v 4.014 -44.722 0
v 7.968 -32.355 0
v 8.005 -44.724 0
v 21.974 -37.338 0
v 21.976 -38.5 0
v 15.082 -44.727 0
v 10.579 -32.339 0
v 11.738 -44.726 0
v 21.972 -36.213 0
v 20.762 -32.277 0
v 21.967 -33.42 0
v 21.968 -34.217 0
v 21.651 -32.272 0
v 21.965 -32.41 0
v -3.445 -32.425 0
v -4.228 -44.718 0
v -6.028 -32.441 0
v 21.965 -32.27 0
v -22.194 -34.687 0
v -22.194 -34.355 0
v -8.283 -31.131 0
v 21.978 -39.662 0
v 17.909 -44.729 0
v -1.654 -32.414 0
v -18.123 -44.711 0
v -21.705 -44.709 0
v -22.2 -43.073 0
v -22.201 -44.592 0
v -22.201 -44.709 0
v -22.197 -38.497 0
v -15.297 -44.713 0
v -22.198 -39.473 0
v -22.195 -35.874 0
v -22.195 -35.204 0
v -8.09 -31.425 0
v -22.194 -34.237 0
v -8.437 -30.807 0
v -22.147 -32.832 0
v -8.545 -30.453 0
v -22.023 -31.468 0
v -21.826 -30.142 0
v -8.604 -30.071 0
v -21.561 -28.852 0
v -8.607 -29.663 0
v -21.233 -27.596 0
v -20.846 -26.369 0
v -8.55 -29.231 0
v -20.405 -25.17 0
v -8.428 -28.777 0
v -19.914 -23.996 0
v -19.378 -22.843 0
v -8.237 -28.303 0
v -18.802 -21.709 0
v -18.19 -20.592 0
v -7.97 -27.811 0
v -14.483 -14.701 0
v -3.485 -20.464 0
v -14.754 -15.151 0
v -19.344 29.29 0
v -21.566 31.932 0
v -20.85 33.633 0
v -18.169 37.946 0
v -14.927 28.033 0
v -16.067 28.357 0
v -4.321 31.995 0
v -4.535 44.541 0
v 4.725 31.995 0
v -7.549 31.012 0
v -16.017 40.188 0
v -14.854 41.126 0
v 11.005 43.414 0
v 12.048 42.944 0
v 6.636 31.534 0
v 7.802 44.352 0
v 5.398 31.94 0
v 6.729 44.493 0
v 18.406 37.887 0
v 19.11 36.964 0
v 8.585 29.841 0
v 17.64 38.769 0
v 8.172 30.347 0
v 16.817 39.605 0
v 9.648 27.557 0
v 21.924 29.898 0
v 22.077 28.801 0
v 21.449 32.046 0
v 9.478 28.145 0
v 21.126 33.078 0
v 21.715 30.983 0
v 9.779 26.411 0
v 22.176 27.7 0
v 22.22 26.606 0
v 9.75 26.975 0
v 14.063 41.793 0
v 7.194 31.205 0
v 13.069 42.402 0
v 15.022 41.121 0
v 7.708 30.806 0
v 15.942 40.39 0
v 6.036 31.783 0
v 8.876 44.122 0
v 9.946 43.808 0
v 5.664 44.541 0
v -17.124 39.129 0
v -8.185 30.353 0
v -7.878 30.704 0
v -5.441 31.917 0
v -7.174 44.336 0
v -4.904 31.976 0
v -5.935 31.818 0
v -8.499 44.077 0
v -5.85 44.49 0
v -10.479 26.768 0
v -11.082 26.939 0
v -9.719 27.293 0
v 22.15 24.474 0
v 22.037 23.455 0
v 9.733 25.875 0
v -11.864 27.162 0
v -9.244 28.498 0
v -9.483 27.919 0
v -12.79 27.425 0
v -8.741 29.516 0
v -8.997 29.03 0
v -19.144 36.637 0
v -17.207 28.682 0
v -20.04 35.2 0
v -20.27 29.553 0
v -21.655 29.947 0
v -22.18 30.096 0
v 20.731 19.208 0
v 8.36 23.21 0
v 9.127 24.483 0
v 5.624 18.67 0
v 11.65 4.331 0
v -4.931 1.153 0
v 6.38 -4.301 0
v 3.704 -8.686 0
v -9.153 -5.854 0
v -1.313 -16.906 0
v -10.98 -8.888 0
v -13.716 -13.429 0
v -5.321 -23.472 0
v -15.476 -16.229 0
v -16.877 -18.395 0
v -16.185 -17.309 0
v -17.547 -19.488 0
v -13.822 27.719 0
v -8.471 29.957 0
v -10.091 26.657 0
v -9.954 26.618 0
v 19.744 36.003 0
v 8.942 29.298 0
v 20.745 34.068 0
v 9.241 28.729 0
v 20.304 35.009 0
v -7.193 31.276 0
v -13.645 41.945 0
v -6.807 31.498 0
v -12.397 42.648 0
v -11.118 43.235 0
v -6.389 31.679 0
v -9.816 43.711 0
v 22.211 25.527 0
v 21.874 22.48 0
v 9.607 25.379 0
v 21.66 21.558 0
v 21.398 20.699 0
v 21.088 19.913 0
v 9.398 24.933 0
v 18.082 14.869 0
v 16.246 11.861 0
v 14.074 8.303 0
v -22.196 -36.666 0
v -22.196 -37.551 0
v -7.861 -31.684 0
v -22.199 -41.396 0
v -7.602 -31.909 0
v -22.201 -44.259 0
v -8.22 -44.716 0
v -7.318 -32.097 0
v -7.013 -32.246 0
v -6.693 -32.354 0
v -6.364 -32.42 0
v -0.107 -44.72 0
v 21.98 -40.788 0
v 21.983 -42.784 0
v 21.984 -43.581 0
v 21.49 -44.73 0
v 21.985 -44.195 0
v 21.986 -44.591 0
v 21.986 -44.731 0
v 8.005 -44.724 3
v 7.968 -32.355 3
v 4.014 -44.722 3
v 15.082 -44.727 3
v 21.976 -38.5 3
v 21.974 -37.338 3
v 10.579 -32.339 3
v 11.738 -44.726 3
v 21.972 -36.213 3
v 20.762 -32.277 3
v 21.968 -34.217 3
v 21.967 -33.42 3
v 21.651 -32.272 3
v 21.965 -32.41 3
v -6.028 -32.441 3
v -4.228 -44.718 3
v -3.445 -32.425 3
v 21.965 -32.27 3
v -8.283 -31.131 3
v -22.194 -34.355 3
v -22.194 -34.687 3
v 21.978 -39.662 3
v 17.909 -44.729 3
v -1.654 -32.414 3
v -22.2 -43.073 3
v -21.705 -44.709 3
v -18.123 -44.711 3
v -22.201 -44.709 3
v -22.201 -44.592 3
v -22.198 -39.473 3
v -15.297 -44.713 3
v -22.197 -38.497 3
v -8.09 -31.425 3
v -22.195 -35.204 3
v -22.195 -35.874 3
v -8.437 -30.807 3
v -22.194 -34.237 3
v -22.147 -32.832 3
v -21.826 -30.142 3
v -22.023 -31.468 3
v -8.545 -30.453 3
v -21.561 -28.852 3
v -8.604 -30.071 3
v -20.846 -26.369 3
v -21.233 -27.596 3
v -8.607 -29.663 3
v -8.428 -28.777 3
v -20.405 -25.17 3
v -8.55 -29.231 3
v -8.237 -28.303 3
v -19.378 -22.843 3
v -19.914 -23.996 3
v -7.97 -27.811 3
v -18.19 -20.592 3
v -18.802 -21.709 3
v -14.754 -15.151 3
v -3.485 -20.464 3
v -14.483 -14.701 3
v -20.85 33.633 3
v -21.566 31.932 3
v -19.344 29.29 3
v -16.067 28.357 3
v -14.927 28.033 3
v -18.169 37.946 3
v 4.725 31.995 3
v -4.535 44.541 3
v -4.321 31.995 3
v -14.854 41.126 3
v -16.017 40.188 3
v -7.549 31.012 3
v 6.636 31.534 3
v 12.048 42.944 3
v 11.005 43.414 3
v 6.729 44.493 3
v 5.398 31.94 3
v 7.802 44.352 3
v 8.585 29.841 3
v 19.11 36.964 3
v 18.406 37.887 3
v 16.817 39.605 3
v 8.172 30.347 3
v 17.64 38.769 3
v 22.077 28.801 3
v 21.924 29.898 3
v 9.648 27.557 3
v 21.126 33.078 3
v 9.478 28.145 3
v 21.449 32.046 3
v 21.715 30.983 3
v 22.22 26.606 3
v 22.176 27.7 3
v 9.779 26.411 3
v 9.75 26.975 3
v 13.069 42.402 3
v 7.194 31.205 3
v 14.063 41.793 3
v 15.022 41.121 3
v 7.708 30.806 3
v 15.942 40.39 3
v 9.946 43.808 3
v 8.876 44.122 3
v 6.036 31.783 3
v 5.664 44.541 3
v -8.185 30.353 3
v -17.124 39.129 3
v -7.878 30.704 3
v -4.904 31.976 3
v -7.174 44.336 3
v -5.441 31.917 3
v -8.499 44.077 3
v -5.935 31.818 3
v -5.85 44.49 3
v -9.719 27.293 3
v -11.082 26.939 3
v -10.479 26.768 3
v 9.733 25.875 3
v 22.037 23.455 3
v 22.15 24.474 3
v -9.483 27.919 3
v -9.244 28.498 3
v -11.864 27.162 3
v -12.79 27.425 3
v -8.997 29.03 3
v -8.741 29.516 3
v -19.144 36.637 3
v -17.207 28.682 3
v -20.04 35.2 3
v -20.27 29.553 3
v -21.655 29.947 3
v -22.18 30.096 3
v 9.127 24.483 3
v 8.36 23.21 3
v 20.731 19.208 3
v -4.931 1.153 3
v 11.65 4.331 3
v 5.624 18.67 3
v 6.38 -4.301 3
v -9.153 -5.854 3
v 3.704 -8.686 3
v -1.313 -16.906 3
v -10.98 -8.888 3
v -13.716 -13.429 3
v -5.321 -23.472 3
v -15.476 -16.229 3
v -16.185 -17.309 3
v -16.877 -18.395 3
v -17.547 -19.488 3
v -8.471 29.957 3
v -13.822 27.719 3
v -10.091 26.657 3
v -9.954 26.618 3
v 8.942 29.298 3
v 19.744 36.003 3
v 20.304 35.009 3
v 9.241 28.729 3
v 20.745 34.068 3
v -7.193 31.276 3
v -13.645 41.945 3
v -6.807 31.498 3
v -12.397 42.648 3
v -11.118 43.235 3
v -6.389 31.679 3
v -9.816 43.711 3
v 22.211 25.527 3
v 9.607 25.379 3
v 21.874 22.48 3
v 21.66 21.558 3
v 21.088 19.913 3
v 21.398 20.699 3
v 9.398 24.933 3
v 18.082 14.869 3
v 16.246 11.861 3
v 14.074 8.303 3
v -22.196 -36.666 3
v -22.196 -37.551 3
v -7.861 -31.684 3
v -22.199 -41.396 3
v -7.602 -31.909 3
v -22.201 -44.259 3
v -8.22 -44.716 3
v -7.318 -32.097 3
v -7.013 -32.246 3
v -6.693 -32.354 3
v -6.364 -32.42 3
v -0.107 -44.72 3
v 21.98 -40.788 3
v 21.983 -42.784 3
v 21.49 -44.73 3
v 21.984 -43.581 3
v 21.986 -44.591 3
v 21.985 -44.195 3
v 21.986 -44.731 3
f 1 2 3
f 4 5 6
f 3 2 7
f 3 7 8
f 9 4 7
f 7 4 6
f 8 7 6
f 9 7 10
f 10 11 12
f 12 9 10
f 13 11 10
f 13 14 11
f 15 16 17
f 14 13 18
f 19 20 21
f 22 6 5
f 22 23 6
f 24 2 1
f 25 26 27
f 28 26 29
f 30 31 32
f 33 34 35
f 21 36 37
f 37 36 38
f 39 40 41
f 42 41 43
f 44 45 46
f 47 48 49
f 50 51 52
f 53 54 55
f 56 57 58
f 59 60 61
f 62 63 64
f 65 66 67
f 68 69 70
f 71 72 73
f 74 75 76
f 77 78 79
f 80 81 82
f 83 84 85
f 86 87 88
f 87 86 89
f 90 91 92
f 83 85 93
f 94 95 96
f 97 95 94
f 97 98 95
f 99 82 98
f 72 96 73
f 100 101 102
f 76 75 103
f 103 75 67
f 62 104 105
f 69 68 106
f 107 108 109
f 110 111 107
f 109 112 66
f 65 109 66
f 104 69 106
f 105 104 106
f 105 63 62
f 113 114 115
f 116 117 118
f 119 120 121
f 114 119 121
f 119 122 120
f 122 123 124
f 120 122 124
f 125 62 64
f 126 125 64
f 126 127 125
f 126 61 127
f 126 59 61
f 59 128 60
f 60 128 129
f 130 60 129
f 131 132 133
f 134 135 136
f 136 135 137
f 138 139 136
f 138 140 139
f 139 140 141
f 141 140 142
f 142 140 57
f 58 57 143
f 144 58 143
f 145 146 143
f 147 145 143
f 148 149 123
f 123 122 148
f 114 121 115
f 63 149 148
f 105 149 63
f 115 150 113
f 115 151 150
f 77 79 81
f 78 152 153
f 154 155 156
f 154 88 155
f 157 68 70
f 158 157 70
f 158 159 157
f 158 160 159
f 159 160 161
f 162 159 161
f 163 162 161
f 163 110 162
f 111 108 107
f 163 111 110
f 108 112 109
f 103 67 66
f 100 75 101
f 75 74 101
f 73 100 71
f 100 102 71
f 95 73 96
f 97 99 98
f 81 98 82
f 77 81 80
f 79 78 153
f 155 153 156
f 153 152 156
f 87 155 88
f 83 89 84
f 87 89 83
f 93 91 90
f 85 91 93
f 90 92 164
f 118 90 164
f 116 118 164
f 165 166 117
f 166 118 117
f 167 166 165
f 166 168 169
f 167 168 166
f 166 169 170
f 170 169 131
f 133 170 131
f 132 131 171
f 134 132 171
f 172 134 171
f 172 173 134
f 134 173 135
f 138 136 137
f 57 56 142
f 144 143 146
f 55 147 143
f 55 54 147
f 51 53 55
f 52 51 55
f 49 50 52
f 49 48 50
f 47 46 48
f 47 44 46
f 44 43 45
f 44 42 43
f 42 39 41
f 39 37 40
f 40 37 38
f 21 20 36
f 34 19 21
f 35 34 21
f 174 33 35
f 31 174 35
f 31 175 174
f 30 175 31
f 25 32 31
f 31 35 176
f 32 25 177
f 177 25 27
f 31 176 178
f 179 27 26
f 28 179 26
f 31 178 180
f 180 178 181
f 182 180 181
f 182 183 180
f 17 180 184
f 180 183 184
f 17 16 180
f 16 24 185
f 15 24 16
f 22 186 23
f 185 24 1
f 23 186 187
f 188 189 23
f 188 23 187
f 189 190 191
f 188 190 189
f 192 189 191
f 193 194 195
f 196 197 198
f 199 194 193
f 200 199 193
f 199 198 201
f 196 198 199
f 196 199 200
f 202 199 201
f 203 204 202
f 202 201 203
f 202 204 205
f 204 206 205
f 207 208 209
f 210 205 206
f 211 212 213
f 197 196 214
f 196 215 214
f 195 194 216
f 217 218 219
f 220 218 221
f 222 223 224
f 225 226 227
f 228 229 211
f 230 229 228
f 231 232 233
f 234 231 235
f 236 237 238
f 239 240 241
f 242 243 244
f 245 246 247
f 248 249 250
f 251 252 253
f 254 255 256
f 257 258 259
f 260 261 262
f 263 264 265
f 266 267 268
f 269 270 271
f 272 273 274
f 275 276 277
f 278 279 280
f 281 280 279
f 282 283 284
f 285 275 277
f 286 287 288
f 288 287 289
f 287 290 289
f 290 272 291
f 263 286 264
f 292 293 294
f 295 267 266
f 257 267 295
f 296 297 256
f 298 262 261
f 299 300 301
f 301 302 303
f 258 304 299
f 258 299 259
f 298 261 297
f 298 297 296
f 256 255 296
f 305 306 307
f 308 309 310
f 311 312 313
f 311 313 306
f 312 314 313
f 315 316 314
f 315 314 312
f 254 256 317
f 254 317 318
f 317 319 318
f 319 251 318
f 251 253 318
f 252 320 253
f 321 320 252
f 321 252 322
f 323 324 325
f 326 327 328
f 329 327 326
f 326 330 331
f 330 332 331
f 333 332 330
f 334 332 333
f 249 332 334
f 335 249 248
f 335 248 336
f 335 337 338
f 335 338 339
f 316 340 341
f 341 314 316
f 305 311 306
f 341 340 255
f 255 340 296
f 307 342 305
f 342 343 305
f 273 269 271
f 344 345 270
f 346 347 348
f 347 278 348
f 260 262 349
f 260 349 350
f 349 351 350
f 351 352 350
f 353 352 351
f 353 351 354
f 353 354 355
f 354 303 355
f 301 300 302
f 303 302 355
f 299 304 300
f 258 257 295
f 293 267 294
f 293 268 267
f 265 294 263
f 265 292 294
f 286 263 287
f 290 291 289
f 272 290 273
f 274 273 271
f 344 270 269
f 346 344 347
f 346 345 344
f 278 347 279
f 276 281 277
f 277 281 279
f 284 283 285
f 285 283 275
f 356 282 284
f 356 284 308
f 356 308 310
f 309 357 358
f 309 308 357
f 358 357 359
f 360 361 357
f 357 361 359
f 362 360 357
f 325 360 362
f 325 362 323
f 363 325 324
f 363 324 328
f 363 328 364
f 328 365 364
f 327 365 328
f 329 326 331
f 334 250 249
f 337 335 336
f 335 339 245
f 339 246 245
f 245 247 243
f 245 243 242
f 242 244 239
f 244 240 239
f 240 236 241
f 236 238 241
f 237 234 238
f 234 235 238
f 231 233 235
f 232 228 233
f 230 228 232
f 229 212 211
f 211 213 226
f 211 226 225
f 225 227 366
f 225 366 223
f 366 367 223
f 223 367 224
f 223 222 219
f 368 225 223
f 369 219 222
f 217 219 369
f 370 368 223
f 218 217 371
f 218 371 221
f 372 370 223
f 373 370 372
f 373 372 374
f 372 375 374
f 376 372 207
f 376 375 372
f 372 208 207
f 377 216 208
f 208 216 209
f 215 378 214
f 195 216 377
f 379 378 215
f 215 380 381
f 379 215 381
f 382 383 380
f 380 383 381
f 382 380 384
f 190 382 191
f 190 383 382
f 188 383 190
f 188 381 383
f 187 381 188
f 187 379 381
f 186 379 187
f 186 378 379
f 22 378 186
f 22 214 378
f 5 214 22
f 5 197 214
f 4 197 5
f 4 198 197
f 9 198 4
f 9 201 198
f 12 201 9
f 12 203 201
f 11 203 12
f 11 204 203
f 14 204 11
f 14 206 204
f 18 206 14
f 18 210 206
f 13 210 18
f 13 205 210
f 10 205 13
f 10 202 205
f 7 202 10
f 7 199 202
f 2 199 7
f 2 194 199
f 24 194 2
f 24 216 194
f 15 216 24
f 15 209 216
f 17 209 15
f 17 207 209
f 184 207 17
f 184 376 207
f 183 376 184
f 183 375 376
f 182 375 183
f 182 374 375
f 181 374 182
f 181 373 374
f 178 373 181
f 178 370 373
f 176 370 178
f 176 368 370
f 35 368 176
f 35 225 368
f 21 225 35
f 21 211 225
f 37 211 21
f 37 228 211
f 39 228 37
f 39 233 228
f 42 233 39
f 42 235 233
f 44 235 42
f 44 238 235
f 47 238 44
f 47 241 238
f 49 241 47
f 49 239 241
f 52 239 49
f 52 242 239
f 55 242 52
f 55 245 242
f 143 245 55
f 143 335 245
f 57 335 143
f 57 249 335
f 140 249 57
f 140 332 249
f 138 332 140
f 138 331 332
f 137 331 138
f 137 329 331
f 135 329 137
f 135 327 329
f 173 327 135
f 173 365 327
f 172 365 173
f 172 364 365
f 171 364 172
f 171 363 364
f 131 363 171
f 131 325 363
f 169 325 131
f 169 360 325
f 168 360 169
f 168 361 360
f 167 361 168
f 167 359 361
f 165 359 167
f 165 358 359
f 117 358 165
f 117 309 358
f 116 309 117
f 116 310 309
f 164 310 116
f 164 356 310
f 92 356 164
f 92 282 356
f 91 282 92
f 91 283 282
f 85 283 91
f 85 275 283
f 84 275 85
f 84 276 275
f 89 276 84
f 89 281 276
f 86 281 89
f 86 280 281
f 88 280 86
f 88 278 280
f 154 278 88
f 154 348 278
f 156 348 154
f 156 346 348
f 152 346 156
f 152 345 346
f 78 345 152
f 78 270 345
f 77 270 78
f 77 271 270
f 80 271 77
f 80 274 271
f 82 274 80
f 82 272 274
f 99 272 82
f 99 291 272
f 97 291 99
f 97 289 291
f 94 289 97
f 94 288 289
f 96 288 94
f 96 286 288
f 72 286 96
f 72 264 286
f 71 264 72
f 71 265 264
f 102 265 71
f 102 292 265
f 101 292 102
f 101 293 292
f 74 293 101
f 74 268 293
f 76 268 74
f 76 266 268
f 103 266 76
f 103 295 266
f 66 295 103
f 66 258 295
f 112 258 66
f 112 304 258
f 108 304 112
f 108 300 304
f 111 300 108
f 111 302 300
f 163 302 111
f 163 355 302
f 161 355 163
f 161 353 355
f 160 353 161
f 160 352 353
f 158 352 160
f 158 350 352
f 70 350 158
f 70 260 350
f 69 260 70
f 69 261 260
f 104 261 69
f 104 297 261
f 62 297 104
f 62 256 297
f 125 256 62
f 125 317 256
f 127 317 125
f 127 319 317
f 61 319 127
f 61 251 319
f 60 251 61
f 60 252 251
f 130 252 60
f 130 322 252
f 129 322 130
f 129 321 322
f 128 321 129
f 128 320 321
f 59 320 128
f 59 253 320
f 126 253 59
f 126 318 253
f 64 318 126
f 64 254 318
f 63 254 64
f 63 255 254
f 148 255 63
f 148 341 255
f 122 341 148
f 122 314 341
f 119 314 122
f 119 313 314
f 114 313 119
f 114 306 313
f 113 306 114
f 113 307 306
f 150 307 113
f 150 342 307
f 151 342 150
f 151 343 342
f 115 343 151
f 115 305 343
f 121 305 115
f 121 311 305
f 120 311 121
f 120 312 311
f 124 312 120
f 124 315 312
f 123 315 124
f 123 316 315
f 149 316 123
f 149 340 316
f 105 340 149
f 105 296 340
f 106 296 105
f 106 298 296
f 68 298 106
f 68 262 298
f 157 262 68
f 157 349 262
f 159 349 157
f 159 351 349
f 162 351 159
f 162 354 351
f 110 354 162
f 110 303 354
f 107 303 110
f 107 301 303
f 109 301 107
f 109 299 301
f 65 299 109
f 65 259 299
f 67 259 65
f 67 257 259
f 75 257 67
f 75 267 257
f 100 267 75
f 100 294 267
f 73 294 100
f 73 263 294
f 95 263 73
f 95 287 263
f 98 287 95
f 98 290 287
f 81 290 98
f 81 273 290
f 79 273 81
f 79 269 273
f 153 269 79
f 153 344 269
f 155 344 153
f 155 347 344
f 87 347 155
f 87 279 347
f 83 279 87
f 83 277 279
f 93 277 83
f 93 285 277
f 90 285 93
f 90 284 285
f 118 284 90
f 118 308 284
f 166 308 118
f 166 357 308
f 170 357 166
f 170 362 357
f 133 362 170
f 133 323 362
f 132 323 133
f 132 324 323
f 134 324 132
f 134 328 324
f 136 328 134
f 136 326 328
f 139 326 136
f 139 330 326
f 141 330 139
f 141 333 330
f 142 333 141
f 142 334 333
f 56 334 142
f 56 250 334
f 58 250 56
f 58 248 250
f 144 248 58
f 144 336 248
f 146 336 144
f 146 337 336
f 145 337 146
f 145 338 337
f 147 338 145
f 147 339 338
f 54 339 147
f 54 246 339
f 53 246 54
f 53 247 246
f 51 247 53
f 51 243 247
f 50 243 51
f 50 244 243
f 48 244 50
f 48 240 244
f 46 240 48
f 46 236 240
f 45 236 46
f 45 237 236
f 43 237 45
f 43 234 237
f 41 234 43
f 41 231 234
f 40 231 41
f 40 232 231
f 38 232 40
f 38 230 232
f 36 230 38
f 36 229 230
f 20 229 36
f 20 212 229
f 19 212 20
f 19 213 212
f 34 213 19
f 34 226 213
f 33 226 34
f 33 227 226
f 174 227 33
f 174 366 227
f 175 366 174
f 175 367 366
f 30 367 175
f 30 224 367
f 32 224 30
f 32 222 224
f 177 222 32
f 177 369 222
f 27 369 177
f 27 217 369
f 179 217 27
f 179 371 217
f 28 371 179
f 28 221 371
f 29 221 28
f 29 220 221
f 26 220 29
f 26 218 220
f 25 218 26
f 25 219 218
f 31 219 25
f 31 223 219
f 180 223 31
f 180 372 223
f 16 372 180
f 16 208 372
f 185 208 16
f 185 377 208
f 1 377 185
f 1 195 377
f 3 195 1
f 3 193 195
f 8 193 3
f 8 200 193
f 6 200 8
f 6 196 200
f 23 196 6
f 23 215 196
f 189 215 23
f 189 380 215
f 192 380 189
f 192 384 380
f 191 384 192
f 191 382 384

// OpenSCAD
// Generated from 交通部公路局（原交通部公路總局）「新式號牌使用之英文字、數字字體」author trace
fudge = 0.1;

module glyph_2012_2(h = 3) {
  difference() {
    linear_extrude(height = h)
      polygon(points = [[-22.18, 30.0962], [-22.0427, 30.0571], [-21.6547, 29.9467], [-21.0517, 29.7752], [-20.2697, 29.5528], [-19.3444, 29.2896], [-18.3117, 28.9958], [-17.2073, 28.6816], [-16.0671, 28.3573], [-14.9269, 28.0329], [-13.8225, 27.7188], [-12.7898, 27.425], [-11.8645, 27.1618], [-11.0825, 26.9393], [-10.4795, 26.7678], [-10.0915, 26.6574], [-9.9542, 26.6183], [-9.7188, 27.2927], [-9.483, 27.9191], [-9.2436, 28.4981], [-8.9974, 29.0303], [-8.7409, 29.5164], [-8.4712, 29.9569], [-8.1847, 30.3526], [-7.8784, 30.7039], [-7.5489, 31.0116], [-7.1931, 31.2763], [-6.8075, 31.4985], [-6.3891, 31.679], [-5.9346, 31.8182], [-5.4406, 31.9169], [-4.9039, 31.9757], [-4.3214, 31.9951], [-4.2198, 31.9951], [-3.9327, 31.9951], [-3.4865, 31.9951], [-2.9079, 31.9951], [-2.2232, 31.9951], [-1.459, 31.9951], [-0.6418, 31.9951], [0.2019, 31.9951], [1.0456, 31.9951], [1.8628, 31.9951], [2.627, 31.9951], [3.3117, 31.9951], [3.8904, 31.9951], [4.3365, 31.9951], [4.6236, 31.9951], [4.7252, 31.9951], [5.3981, 31.9404], [6.0363, 31.7832], [6.6362, 31.5344], [7.1944, 31.2049], [7.7076, 30.8056], [8.1723, 30.3475], [8.5851, 29.8415], [8.9425, 29.2985], [9.2412, 28.7294], [9.4776, 28.1452], [9.6484, 27.5567], [9.7502, 26.9749], [9.7794, 26.4107], [9.7327, 25.875], [9.6067, 25.3787], [9.3979, 24.9328], [9.1267, 24.4826], [8.3601, 23.2104], [7.169, 21.2336], [5.6241, 18.6697], [3.7962, 15.636], [1.756, 12.25], [-0.4257, 8.6292], [-2.6782, 4.8909], [-4.9307, 1.1526], [-7.1124, -2.4683], [-9.1526, -5.8543], [-10.9805, -8.8879], [-12.5254, -11.4519], [-13.7165, -13.4287], [-14.483, -14.7009], [-14.7543, -15.151], [-15.4762, -16.2291], [-16.1853, -17.3095], [-16.877, -18.3949], [-17.5467, -19.4882], [-18.1899, -20.5921], [-18.8019, -21.7095], [-19.378, -22.8431], [-19.9138, -23.9958], [-20.4046, -25.1702], [-20.8458, -26.3693], [-21.2328, -27.5958], [-21.5611, -28.8525], [-21.8259, -30.1423], [-22.0227, -31.4678], [-22.147, -32.8319], [-22.194, -34.2374], [-22.1941, -34.355], [-22.1943, -34.6874], [-22.1947, -35.2038], [-22.1951, -35.8736], [-22.1957, -36.6662], [-22.1963, -37.5508], [-22.197, -38.4967], [-22.1976, -39.4733], [-22.1983, -40.45], [-22.199, -41.3959], [-22.1996, -42.2805], [-22.2001, -43.0731], [-22.2006, -43.7429], [-22.201, -44.2593], [-22.2012, -44.5917], [-22.2013, -44.7093], [-21.705, -44.7095], [-20.3026, -44.7102], [-18.1234, -44.7113], [-15.297, -44.7126], [-11.9527, -44.7142], [-8.22, -44.716], [-4.2285, -44.718], [-0.1074, -44.7199], [4.0136, -44.7219], [8.0052, -44.7239], [11.7378, -44.7256], [15.0821, -44.7273], [17.9086, -44.7286], [20.0877, -44.7297], [21.4902, -44.7304], [21.9864, -44.7306], [21.9862, -44.5907], [21.9855, -44.1952], [21.9845, -43.5807], [21.9831, -42.7836], [21.9815, -41.8406], [21.9797, -40.788], [21.9777, -39.6624], [21.9758, -38.5004], [21.9738, -37.3383], [21.9718, -36.2127], [21.97, -35.1601], [21.9684, -34.2171], [21.9671, -33.42], [21.966, -32.8055], [21.9653, -32.4101], [21.9651, -32.2701], [21.6507, -32.272], [20.7622, -32.2775], [19.3817, -32.2859], [17.5911, -32.2968], [15.4725, -32.3097], [13.1078, -32.3241], [10.5791, -32.3395], [7.9684, -32.3555], [5.3577, -32.3714], [2.829, -32.3868], [0.4643, -32.4012], [-1.6543, -32.4141], [-3.4449, -32.4251], [-4.8254, -32.4335], [-5.7139, -32.4389], [-6.0283, -32.4408], [-6.3636, -32.4197], [-6.6935, -32.3541], [-7.0132, -32.2459], [-7.3177, -32.097], [-7.6019, -31.9092], [-7.8609, -31.6845], [-8.0897, -31.4246], [-8.2834, -31.1314], [-8.4369, -30.8068], [-8.5453, -30.4526], [-8.6037, -30.0707], [-8.6069, -29.663], [-8.5502, -29.2313], [-8.4284, -28.7774], [-8.2366, -28.3033], [-7.9699, -27.8108], [-7.6476, -27.2828], [-6.7367, -25.7905], [-5.3213, -23.4717], [-3.4855, -20.4641], [-1.3133, -16.9056], [1.1111, -12.9338], [3.7037, -8.6865], [6.3803, -4.3014], [9.057, 0.0836], [11.6496, 4.3309], [14.074, 8.3027], [16.2461, 11.8613], [18.082, 14.8688], [19.4974, 17.1876], [20.4083, 18.6799], [20.7306, 19.2079], [21.088, 19.9128], [21.3983, 20.6994], [21.6604, 21.5582], [21.8736, 22.4799], [22.037, 23.4549], [22.1497, 24.4739], [22.211, 25.5274], [22.2199, 26.6061], [22.1756, 27.7004], [22.0772, 28.801], [21.9239, 29.8985], [21.7149, 30.9834], [21.4492, 32.0464], [21.1261, 33.0779], [20.7447, 34.0685], [20.3041, 35.0089], [19.7443, 36.003], [19.1098, 36.9638], [18.4065, 37.8872], [17.6403, 38.769], [16.8169, 39.6047], [15.9423, 40.3902], [15.0223, 41.1212], [14.0627, 41.7933], [13.0694, 42.4024], [12.0483, 42.9441], [11.0051, 43.4142], [9.9458, 43.8085], [8.8762, 44.1225], [7.8021, 44.3521], [6.7295, 44.493], [5.664, 44.541], [5.5495, 44.541], [5.2258, 44.541], [4.7228, 44.541], [4.0705, 44.541], [3.2986, 44.541], [2.4371, 44.541], [1.5158, 44.541], [0.5646, 44.541], [-0.3865, 44.541], [-1.3078, 44.541], [-2.1693, 44.541], [-2.9412, 44.541], [-3.5936, 44.541], [-4.0965, 44.541], [-4.4202, 44.541], [-4.5348, 44.541], [-5.8501, 44.49], [-7.1741, 44.3363], [-8.4986, 44.0775], [-9.8159, 43.7113], [-11.118, 43.2355], [-12.397, 42.6476], [-13.645, 41.9453], [-14.8542, 41.1264], [-16.0166, 40.1885], [-17.1243, 39.1292], [-18.1694, 37.9464], [-19.1441, 36.6375], [-20.0404, 35.2004], [-20.8504, 33.6327], [-21.5662, 31.9321], [-22.18, 30.0962], [-22.18, 30.0962], [-22.18, 30.0962], [-22.18, 30.0962], [-22.18, 30.0962], [-22.18, 30.0962], [-22.18, 30.0962], [-22.18, 30.0962], [-22.18, 30.0962], [-22.18, 30.0962], [-22.18, 30.0962], [-22.18, 30.0962], [-22.18, 30.0962], [-22.18, 30.0962], [-22.18, 30.0962], [-22.18, 30.0962]]);
  }
}

glyph_2012_2();
